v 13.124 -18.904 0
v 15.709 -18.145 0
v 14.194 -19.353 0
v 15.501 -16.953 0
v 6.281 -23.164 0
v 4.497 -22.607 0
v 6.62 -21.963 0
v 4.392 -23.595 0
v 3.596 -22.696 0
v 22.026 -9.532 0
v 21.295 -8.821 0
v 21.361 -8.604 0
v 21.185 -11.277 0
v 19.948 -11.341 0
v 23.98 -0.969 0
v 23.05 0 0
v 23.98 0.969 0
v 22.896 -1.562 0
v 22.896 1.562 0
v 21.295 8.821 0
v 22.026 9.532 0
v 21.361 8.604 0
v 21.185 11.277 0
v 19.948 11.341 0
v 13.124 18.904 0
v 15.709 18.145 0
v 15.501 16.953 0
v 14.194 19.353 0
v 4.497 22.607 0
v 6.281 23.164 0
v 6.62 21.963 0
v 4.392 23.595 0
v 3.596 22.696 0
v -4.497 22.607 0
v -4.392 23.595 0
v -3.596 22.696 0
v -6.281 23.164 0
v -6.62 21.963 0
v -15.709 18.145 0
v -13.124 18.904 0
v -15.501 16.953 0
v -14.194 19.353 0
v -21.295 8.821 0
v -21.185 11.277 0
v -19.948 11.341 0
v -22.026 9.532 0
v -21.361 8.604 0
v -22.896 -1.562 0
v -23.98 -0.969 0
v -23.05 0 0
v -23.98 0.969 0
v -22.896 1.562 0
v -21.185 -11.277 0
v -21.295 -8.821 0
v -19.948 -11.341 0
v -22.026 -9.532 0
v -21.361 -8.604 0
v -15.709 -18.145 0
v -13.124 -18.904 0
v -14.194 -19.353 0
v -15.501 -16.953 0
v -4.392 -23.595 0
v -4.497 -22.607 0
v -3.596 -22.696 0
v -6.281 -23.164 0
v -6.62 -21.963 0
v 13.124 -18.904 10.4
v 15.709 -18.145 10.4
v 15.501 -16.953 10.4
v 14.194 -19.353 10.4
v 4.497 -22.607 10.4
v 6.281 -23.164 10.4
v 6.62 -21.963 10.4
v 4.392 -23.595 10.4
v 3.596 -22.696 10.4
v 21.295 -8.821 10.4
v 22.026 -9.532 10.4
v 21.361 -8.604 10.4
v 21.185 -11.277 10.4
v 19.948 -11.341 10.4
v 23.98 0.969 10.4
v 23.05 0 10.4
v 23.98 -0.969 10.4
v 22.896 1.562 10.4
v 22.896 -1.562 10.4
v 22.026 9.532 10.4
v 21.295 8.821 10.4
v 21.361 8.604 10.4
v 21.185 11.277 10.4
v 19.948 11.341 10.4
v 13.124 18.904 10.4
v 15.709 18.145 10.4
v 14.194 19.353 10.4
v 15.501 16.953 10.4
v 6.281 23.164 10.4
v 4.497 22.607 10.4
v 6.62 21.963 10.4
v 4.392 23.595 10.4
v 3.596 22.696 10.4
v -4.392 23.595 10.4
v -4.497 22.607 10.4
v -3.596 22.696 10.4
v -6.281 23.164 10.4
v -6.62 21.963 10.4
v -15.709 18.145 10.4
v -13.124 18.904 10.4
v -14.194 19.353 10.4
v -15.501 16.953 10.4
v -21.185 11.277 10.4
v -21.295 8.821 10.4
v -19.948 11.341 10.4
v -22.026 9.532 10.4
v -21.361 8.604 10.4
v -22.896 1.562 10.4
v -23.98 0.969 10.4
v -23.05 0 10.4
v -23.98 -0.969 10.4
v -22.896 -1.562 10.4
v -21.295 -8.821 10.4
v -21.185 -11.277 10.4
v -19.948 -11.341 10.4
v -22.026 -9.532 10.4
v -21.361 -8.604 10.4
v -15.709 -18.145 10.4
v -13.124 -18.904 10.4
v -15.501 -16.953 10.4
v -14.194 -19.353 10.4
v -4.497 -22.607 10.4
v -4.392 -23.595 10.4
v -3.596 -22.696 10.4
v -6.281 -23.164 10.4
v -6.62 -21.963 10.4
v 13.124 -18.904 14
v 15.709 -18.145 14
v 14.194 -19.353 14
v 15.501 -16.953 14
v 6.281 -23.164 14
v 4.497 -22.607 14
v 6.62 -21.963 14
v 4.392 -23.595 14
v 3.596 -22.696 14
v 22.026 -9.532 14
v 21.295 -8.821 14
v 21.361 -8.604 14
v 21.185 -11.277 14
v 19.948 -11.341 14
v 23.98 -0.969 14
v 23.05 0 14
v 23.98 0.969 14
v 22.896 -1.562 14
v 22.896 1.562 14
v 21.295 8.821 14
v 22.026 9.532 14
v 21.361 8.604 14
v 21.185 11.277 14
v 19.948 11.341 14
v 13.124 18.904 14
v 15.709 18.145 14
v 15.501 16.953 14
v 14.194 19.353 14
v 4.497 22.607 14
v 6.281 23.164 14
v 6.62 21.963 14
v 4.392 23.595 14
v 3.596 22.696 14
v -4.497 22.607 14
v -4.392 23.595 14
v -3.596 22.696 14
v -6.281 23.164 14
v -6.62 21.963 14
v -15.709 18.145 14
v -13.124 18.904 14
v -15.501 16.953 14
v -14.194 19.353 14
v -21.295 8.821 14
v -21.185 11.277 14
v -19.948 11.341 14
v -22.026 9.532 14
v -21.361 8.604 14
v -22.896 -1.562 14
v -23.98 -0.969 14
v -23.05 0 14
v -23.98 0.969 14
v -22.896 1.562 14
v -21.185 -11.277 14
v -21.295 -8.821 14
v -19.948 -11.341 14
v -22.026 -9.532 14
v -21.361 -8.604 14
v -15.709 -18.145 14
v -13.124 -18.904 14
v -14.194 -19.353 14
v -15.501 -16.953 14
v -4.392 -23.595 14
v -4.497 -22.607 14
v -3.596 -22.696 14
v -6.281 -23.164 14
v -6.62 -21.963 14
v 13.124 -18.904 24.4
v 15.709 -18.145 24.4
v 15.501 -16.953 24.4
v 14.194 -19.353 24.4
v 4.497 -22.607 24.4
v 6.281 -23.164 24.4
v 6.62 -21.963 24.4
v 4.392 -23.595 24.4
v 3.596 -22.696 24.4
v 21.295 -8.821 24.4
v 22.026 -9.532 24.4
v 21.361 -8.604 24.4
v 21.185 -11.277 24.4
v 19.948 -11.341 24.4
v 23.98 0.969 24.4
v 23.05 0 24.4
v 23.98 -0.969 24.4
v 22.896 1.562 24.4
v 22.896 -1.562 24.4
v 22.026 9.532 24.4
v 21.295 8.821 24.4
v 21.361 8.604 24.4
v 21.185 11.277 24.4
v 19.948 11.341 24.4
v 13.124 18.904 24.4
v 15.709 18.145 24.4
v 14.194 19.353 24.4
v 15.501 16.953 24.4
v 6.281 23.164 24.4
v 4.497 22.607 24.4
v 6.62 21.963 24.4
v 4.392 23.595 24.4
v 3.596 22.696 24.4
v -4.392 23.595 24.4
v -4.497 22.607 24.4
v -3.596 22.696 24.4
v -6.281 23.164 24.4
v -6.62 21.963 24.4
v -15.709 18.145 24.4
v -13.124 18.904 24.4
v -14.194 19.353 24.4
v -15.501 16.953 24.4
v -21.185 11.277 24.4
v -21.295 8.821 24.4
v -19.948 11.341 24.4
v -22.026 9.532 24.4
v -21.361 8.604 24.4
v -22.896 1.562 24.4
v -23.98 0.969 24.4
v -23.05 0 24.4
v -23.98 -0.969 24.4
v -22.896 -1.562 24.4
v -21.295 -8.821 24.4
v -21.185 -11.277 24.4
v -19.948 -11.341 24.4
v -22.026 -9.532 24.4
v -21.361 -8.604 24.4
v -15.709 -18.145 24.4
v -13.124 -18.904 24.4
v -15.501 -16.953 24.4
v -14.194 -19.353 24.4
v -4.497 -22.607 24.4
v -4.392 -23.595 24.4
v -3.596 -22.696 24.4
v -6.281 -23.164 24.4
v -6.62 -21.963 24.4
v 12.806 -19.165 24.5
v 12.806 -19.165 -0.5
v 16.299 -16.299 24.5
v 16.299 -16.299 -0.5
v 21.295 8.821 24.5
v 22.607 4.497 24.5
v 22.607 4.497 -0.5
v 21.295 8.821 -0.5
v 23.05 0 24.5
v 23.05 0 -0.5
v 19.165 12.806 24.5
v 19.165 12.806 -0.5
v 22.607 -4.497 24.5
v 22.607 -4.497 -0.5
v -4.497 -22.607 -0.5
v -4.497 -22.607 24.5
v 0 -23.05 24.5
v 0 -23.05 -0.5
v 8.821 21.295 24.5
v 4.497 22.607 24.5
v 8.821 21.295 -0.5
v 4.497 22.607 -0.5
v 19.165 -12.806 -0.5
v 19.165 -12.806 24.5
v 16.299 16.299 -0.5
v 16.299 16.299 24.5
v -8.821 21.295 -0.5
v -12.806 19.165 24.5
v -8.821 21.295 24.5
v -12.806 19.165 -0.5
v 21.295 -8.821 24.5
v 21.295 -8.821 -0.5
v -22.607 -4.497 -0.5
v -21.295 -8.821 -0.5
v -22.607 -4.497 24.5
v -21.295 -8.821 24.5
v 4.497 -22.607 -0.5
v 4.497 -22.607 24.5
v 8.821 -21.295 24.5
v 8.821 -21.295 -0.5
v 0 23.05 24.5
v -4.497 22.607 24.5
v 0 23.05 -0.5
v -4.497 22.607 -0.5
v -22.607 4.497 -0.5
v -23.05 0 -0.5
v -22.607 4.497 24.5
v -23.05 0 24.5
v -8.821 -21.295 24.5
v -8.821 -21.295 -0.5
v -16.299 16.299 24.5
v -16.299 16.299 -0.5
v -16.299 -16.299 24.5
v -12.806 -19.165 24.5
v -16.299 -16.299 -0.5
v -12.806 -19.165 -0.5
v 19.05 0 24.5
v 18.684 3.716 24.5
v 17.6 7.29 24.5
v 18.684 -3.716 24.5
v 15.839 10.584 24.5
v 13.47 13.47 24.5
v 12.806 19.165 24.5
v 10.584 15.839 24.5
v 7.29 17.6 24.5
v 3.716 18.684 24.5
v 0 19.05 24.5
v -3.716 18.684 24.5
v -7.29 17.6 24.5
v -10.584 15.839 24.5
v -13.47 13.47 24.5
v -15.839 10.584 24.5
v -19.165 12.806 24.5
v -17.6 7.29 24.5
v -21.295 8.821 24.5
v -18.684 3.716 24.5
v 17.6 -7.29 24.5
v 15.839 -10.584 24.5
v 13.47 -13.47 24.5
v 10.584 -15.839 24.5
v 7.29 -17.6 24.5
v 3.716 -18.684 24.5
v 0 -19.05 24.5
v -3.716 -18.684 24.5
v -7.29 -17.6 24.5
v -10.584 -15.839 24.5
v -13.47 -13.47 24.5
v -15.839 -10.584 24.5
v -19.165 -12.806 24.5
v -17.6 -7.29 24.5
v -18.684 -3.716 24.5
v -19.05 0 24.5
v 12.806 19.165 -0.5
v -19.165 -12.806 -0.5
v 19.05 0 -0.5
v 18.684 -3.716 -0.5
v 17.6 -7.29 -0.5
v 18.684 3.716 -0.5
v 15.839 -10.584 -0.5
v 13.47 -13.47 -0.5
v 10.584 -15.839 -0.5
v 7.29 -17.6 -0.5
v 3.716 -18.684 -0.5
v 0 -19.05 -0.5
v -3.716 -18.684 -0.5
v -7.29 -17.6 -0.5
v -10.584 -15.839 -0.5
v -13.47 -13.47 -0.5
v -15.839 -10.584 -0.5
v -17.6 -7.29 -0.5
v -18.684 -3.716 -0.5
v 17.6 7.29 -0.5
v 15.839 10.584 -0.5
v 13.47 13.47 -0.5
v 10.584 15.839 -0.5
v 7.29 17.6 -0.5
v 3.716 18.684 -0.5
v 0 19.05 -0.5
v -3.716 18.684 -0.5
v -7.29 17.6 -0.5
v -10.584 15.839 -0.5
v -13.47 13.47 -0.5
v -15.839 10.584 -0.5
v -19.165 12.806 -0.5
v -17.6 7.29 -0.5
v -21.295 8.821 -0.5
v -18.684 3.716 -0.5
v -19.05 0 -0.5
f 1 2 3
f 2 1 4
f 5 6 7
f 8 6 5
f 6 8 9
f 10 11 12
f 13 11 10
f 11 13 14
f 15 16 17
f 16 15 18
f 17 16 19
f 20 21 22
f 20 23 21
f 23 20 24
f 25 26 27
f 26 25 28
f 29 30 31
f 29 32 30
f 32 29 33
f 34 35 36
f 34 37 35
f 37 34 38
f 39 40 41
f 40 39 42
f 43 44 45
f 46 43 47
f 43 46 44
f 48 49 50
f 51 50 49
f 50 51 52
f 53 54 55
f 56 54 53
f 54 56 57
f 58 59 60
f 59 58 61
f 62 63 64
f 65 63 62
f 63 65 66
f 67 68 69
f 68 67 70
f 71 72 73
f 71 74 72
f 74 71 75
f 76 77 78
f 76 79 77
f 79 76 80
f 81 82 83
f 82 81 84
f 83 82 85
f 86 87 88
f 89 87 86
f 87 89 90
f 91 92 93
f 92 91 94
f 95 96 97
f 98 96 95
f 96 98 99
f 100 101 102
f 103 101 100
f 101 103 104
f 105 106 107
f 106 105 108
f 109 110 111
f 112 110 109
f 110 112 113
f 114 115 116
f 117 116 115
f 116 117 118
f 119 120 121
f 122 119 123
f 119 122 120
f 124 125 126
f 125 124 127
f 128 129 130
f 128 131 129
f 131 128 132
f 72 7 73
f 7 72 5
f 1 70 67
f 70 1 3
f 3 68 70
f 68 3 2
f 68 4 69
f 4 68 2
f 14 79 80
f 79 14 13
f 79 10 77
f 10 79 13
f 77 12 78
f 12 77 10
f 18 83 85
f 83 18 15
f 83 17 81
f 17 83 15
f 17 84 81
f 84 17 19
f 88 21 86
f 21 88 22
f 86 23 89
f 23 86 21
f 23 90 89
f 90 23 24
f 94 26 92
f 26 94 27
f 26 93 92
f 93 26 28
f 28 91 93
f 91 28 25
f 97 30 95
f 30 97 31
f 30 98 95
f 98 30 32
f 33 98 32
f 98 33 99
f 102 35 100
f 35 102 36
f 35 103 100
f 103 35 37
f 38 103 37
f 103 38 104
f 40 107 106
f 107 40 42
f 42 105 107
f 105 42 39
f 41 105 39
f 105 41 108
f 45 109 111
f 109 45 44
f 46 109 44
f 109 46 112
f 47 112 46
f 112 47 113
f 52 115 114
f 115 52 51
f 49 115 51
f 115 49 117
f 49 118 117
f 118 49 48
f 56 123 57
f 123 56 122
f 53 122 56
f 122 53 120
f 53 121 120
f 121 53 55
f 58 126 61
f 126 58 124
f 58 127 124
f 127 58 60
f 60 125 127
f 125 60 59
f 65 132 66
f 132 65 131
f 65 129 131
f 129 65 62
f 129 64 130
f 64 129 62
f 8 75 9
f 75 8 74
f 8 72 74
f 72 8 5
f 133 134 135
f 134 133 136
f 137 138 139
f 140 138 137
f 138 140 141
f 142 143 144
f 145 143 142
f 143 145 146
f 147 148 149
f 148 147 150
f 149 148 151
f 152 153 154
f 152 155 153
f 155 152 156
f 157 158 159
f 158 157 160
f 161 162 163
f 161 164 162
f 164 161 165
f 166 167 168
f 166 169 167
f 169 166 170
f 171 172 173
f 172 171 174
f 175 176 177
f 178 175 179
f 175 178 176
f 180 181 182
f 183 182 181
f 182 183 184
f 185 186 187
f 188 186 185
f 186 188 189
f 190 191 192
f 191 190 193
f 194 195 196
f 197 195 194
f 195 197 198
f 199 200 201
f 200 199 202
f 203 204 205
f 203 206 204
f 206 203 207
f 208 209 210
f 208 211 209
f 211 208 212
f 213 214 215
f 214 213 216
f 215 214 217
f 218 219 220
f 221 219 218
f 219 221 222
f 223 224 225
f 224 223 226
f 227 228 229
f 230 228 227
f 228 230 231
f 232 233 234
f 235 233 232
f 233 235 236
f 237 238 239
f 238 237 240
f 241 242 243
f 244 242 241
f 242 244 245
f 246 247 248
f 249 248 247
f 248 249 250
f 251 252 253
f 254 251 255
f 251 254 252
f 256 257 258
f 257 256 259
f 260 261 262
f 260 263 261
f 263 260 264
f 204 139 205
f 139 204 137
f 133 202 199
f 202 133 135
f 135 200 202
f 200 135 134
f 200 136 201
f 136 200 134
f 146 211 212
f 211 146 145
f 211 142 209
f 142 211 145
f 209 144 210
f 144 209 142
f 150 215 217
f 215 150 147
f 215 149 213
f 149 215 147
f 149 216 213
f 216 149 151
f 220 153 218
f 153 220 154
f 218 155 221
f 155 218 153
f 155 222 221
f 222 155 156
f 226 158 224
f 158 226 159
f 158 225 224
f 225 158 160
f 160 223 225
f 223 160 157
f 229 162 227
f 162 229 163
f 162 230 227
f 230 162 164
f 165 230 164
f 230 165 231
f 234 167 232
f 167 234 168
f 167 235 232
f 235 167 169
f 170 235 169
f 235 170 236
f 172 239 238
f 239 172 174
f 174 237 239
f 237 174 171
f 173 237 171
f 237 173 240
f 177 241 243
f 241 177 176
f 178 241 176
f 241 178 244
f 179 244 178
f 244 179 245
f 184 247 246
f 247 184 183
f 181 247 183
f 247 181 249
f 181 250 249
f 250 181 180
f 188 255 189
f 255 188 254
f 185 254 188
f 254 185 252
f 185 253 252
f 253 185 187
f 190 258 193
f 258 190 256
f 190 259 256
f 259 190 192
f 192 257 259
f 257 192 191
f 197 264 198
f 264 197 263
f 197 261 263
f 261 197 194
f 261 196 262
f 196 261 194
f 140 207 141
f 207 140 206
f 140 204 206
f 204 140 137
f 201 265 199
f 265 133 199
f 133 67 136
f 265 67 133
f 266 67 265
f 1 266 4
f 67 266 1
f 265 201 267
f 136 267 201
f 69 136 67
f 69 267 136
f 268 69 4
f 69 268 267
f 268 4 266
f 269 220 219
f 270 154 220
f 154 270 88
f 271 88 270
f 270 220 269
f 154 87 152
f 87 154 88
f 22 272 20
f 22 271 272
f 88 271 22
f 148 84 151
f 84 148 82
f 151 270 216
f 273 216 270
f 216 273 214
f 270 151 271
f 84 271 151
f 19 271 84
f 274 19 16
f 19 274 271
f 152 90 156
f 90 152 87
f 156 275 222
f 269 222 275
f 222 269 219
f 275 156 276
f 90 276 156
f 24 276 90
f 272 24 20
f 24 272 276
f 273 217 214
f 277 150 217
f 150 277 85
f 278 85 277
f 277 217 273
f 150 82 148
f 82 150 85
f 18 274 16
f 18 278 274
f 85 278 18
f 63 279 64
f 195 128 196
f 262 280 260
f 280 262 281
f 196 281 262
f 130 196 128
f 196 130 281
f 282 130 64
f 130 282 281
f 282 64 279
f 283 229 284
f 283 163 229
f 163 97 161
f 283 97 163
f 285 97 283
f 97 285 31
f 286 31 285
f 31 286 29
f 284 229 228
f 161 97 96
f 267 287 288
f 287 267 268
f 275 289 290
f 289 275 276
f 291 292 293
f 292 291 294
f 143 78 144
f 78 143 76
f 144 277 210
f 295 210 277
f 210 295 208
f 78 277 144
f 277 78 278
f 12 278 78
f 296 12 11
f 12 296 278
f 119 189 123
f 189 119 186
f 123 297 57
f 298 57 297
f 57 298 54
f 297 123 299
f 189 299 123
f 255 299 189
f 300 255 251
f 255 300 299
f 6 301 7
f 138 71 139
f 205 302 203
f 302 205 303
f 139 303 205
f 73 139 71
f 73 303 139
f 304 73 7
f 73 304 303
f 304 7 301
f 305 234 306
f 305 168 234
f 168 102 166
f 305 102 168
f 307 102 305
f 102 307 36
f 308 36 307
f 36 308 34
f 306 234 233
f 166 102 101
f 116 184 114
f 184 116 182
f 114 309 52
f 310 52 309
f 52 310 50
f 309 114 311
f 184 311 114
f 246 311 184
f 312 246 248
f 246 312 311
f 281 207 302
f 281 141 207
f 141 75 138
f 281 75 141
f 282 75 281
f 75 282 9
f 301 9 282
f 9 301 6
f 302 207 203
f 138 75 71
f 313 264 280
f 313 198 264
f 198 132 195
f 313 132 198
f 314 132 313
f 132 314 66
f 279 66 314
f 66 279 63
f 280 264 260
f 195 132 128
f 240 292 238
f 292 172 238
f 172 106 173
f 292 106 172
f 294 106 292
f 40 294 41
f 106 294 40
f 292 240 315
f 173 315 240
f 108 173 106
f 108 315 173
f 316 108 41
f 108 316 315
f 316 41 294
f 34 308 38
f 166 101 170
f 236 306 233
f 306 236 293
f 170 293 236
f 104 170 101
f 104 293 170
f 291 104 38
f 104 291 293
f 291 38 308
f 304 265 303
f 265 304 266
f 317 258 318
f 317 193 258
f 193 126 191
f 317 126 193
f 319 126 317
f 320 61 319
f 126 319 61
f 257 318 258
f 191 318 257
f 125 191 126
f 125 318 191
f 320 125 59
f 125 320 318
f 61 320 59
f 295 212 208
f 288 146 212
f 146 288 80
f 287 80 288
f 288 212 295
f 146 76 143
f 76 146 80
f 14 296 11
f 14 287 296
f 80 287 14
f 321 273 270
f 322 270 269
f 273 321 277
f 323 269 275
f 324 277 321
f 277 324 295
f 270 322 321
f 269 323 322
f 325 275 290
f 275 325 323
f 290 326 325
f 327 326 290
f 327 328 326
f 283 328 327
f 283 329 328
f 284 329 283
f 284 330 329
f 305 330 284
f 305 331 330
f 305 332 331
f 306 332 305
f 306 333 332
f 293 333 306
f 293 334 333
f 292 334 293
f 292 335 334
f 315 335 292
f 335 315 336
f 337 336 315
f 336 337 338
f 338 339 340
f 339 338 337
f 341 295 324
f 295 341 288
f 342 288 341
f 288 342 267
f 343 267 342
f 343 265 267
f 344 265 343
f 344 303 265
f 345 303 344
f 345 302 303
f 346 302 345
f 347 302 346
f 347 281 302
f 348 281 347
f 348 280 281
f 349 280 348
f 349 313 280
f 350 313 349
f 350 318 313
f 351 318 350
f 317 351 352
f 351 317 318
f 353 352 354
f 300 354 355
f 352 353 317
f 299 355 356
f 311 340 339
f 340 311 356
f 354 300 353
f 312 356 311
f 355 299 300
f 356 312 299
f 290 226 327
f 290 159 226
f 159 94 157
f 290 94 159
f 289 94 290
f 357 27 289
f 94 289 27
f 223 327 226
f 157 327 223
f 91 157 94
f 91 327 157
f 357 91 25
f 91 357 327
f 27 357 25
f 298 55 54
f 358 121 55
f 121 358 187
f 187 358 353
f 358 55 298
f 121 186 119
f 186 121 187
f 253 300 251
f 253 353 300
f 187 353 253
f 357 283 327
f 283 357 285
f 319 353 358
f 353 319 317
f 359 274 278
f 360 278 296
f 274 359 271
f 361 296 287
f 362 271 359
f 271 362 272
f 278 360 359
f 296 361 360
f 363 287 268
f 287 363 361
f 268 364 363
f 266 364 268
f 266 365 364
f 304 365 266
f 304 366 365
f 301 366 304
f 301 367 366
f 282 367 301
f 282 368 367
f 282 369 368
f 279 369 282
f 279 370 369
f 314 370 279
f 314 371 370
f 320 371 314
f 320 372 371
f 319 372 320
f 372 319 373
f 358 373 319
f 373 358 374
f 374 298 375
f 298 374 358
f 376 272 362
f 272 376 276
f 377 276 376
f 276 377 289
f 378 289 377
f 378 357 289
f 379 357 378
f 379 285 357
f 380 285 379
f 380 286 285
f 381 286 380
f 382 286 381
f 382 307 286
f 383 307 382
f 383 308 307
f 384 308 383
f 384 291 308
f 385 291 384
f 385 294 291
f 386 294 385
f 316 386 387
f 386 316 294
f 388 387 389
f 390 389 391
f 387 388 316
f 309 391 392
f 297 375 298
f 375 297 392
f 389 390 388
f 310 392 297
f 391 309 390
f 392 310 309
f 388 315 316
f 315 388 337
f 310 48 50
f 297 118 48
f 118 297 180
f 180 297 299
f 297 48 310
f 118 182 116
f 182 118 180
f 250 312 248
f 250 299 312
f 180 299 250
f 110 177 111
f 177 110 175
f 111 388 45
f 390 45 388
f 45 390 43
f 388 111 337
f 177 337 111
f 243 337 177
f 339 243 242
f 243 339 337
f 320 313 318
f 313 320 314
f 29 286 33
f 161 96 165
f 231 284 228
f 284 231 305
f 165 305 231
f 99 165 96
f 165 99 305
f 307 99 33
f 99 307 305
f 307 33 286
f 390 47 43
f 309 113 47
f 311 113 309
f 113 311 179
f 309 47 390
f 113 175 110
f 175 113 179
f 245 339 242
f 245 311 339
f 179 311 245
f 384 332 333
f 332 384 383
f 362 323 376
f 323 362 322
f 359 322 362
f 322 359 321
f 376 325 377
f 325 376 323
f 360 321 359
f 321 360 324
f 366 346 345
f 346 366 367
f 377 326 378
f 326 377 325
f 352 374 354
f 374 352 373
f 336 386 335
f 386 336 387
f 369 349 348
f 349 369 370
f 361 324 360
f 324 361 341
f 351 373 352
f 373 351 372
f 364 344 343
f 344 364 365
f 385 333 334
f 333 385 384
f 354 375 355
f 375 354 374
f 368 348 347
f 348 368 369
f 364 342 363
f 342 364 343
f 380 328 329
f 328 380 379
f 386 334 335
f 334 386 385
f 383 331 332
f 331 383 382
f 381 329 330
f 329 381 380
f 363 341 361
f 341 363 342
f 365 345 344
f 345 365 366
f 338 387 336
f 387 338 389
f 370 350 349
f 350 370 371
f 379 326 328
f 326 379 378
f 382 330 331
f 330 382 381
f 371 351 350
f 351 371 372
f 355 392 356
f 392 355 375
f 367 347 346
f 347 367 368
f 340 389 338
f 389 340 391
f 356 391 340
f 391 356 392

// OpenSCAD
$fn = 32;

// ----------------------------------------------------------------------
// Two-module gear rim: z14 m3 and z14 m3, 24 mm wide
// ----------------------------------------------------------------------

// --- parameters (mm) ---
module_a = 3;             // first tooth module
teeth_a = 14;             // first band tooth count
module_b = 3;             // second tooth module
teeth_b = 14;             // second band tooth count
band_h = 10;              // height of one tooth band
web_t = 4;                // web thickness between the bands
total = 24;               // overall width over both bands
root_r = 17.25;           // root radius of the coarse band
hub_r = 23.05;            // hub radius
bore_d = 38.1;            // hub bore
hole_count = 6;           // lightening holes
hole_r = 13.12;           // lightening hole circle radius
hole_d = 4;               // lightening hole diameter

band_a = [[17.111, -2.185], [21.064, -2.301], [22.526, -1.764], [23.98, -0.969], [23.98, 0.969], [22.526, 1.764], [21.064, 2.301], [17.111, 2.185], [16.364, 5.456], [19.976, 7.066], [21.06, 8.184], [22.026, 9.532], [21.185, 11.277], [19.529, 11.363], [17.979, 11.212], [14.469, 9.392], [12.377, 12.016], [14.932, 15.034], [15.424, 16.511], [15.709, 18.145], [14.194, 19.353], [12.665, 18.711], [11.334, 17.903], [8.961, 14.74], [5.937, 16.196], [6.931, 20.024], [6.732, 21.568], [6.281, 23.164], [4.392, 23.595], [3.293, 22.353], [2.444, 21.048], [1.678, 17.168], [-1.678, 17.168], [-2.444, 21.048], [-3.293, 22.353], [-4.392, 23.595], [-6.281, 23.164], [-6.732, 21.568], [-6.931, 20.024], [-5.937, 16.196], [-8.961, 14.74], [-11.334, 17.903], [-12.665, 18.711], [-14.194, 19.353], [-15.709, 18.145], [-15.424, 16.511], [-14.932, 15.034], [-12.377, 12.016], [-14.469, 9.392], [-17.979, 11.212], [-19.529, 11.363], [-21.185, 11.277], [-22.026, 9.532], [-21.06, 8.184], [-19.976, 7.066], [-16.364, 5.456], [-17.111, 2.185], [-21.064, 2.301], [-22.526, 1.764], [-23.98, 0.969], [-23.98, -0.969], [-22.526, -1.764], [-21.064, -2.301], [-17.111, -2.185], [-16.364, -5.456], [-19.976, -7.066], [-21.06, -8.184], [-22.026, -9.532], [-21.185, -11.277], [-19.529, -11.363], [-17.979, -11.212], [-14.469, -9.392], [-12.377, -12.016], [-14.932, -15.034], [-15.424, -16.511], [-15.709, -18.145], [-14.194, -19.353], [-12.665, -18.711], [-11.334, -17.903], [-8.961, -14.74], [-5.937, -16.196], [-6.931, -20.024], [-6.732, -21.568], [-6.281, -23.164], [-4.392, -23.595], [-3.293, -22.353], [-2.444, -21.048], [-1.678, -17.168], [1.678, -17.168], [2.444, -21.048], [3.293, -22.353], [4.392, -23.595], [6.281, -23.164], [6.732, -21.568], [6.931, -20.024], [5.937, -16.196], [8.961, -14.74], [11.334, -17.903], [12.665, -18.711], [14.194, -19.353], [15.709, -18.145], [15.424, -16.511], [14.932, -15.034], [12.377, -12.016], [14.469, -9.392], [17.979, -11.212], [19.529, -11.363], [21.185, -11.277], [22.026, -9.532], [21.06, -8.184], [19.976, -7.066], [16.364, -5.456]];
band_b = [[17.111, -2.185], [21.064, -2.301], [22.526, -1.764], [23.98, -0.969], [23.98, 0.969], [22.526, 1.764], [21.064, 2.301], [17.111, 2.185], [16.364, 5.456], [19.976, 7.066], [21.06, 8.184], [22.026, 9.532], [21.185, 11.277], [19.529, 11.363], [17.979, 11.212], [14.469, 9.392], [12.377, 12.016], [14.932, 15.034], [15.424, 16.511], [15.709, 18.145], [14.194, 19.353], [12.665, 18.711], [11.334, 17.903], [8.961, 14.74], [5.937, 16.196], [6.931, 20.024], [6.732, 21.568], [6.281, 23.164], [4.392, 23.595], [3.293, 22.353], [2.444, 21.048], [1.678, 17.168], [-1.678, 17.168], [-2.444, 21.048], [-3.293, 22.353], [-4.392, 23.595], [-6.281, 23.164], [-6.732, 21.568], [-6.931, 20.024], [-5.937, 16.196], [-8.961, 14.74], [-11.334, 17.903], [-12.665, 18.711], [-14.194, 19.353], [-15.709, 18.145], [-15.424, 16.511], [-14.932, 15.034], [-12.377, 12.016], [-14.469, 9.392], [-17.979, 11.212], [-19.529, 11.363], [-21.185, 11.277], [-22.026, 9.532], [-21.06, 8.184], [-19.976, 7.066], [-16.364, 5.456], [-17.111, 2.185], [-21.064, 2.301], [-22.526, 1.764], [-23.98, 0.969], [-23.98, -0.969], [-22.526, -1.764], [-21.064, -2.301], [-17.111, -2.185], [-16.364, -5.456], [-19.976, -7.066], [-21.06, -8.184], [-22.026, -9.532], [-21.185, -11.277], [-19.529, -11.363], [-17.979, -11.212], [-14.469, -9.392], [-12.377, -12.016], [-14.932, -15.034], [-15.424, -16.511], [-15.709, -18.145], [-14.194, -19.353], [-12.665, -18.711], [-11.334, -17.903], [-8.961, -14.74], [-5.937, -16.196], [-6.931, -20.024], [-6.732, -21.568], [-6.281, -23.164], [-4.392, -23.595], [-3.293, -22.353], [-2.444, -21.048], [-1.678, -17.168], [1.678, -17.168], [2.444, -21.048], [3.293, -22.353], [4.392, -23.595], [6.281, -23.164], [6.732, -21.568], [6.931, -20.024], [5.937, -16.196], [8.961, -14.74], [11.334, -17.903], [12.665, -18.711], [14.194, -19.353], [15.709, -18.145], [15.424, -16.511], [14.932, -15.034], [12.377, -12.016], [14.469, -9.392], [17.979, -11.212], [19.529, -11.363], [21.185, -11.277], [22.026, -9.532], [21.06, -8.184], [19.976, -7.066], [16.364, -5.456]];

difference() {
  union() {
    /* tooth band A, overlapping the web by 0.4 mm */
    linear_extrude(height = band_h + 0.4) polygon(band_a);
    /* web */
    translate([0, 0, band_h - 0.4]) cylinder(h = web_t + 0.8, d = 2 * root_r);
    /* tooth band B */
    translate([0, 0, band_h + web_t]) linear_extrude(height = band_h + 0.4) polygon(band_b);
    /* hub */
    translate([0, 0, -0.5]) cylinder(h = total + 1.0, d = 2 * hub_r);
  }
  /* bore */
  translate([0, 0, -2.5]) cylinder(h = total + 5, d = bore_d);
  /* lightening holes through the web */
  for (i = [0 : hole_count - 1]) {
    a = i * 360 / hole_count;
    translate([hole_r * cos(a), hole_r * sin(a), -2.5]) cylinder(h = total + 5, d = hole_d);
  }
}
